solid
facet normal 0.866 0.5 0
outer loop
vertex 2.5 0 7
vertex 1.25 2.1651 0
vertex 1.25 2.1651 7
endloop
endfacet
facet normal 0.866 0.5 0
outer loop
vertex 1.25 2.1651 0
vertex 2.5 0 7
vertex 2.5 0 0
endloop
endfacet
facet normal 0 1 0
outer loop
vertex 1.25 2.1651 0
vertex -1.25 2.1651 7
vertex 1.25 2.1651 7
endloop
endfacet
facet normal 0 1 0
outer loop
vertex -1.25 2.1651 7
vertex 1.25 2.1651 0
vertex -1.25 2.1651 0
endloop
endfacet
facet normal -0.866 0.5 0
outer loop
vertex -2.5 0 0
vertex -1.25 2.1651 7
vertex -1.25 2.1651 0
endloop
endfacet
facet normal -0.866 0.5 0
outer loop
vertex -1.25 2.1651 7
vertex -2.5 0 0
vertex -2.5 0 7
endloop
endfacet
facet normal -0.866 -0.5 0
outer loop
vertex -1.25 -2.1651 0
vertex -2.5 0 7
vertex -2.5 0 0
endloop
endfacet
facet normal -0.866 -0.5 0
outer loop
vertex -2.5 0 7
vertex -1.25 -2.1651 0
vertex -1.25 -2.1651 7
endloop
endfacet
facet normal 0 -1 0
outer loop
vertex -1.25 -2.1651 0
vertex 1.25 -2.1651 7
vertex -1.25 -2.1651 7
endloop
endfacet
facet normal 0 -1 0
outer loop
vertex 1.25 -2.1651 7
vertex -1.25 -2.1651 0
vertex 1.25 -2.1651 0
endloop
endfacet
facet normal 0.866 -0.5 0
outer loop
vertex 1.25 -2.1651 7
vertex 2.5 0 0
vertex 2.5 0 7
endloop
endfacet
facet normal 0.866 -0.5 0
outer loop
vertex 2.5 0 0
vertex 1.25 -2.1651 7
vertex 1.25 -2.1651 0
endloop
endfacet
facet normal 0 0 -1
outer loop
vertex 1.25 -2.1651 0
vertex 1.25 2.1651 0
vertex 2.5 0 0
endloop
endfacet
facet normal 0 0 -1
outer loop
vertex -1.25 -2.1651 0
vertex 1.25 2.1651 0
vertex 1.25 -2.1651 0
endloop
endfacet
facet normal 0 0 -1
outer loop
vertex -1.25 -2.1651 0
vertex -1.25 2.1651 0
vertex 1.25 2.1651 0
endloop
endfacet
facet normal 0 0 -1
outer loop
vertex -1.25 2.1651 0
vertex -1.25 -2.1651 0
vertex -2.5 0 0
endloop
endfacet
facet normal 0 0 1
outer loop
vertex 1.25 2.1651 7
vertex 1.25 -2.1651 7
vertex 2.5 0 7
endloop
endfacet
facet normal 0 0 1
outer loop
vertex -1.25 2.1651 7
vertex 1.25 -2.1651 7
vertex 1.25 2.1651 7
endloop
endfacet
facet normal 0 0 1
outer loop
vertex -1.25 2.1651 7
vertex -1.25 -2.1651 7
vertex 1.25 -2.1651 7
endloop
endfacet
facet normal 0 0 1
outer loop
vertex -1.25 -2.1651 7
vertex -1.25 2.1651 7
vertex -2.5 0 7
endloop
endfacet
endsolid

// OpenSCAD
module single_spacer_preview () {
  $fn = 6;
  cylinder(d = 5, h = 7);
}

single_spacer_preview();
